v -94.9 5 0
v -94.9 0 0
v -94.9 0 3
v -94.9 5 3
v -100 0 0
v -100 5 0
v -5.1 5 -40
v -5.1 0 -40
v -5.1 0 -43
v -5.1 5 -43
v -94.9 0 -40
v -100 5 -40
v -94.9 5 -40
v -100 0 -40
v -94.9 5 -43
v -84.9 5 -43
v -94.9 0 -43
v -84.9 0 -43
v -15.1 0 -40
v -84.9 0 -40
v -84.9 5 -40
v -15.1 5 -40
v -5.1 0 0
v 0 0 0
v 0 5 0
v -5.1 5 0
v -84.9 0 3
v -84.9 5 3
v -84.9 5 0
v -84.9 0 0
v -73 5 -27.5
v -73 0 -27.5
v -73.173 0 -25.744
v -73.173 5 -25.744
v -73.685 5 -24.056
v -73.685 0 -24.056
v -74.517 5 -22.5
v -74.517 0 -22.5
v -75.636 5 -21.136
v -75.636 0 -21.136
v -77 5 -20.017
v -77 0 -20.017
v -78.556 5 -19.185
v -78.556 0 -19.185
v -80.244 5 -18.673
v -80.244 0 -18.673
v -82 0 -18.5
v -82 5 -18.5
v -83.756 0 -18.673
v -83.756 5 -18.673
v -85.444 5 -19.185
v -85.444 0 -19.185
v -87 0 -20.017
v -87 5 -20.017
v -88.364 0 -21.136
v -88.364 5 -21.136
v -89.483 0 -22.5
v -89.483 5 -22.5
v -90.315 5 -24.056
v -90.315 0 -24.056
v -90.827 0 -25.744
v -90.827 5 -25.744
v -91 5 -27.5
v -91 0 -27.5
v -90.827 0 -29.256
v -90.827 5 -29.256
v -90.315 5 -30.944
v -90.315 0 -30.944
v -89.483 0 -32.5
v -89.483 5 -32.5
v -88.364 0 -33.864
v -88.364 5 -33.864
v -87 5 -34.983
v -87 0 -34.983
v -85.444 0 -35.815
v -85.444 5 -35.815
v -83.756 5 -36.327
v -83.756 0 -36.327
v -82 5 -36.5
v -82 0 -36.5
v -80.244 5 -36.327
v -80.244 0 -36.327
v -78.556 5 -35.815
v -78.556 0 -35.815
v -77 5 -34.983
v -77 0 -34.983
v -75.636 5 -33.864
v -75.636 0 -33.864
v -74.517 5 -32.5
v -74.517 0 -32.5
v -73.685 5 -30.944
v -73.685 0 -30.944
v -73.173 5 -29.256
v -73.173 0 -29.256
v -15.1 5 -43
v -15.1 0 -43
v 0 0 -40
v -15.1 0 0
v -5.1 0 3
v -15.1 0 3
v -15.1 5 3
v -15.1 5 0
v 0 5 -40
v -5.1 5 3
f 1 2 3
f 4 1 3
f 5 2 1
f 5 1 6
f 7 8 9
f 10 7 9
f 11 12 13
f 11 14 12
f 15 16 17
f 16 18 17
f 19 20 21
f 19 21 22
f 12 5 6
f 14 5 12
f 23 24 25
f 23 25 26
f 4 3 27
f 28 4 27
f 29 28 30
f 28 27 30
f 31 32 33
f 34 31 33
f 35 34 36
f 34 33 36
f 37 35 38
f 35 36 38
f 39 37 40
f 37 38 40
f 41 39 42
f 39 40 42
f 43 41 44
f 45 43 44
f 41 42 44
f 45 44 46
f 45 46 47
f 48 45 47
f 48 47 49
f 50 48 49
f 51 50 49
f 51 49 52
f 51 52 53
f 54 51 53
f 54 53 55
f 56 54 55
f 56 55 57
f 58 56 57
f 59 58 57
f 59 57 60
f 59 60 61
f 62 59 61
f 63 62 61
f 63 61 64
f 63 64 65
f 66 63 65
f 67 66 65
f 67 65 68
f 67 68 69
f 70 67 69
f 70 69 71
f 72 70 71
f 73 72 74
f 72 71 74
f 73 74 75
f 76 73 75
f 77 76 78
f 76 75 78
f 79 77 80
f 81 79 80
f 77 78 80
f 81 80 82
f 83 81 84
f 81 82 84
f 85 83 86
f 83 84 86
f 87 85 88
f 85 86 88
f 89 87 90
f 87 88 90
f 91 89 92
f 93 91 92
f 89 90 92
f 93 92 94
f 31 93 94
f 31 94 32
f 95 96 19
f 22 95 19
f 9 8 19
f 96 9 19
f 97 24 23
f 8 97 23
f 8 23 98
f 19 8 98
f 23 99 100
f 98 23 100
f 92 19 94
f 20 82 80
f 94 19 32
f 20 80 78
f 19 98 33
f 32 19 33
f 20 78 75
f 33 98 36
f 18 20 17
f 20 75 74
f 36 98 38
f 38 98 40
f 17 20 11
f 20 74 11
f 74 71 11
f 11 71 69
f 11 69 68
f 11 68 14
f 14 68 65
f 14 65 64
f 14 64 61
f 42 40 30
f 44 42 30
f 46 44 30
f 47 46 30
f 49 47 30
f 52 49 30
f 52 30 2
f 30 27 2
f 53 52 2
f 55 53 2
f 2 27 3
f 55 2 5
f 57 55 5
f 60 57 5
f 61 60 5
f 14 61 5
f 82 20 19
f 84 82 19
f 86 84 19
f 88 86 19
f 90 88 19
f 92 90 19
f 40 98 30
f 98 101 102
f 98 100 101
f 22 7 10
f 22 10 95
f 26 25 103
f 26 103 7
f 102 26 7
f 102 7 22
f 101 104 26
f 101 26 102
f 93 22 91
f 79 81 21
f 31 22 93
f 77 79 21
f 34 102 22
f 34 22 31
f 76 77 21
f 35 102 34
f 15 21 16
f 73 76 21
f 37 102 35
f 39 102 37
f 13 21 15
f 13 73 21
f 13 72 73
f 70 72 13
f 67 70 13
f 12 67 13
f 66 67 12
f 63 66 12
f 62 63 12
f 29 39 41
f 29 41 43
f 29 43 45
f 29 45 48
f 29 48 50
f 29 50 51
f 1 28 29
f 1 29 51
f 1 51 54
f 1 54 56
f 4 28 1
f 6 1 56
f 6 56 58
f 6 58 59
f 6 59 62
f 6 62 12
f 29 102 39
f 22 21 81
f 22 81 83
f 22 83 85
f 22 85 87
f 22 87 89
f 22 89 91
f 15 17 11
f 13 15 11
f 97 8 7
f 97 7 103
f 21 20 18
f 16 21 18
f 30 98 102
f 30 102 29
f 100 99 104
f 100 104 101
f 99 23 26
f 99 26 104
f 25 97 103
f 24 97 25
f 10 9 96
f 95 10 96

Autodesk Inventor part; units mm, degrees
ref_plane "YZ Plane" through (0, 0, 0) normal (1, 0, 0) x (0, 1, 0)
ref_plane "XZ Plane" through (0, 0, 0) normal (0, 1, 0) x (-1, 0, 0)
ref_plane "XY Plane" through (0, 0, 0) normal (0, 0, 1) x (1, 0, 0)
sketch "Sketch1" plane through (0, 0, 0) normal (0, 1, 0) x (-1, 0, 0)
  line L0 (0, 0) -> (100, 0)
  line L1 (100, 0) -> (100, -40)
  line L2 (100, -40) -> (0, -40)
  line L3 (0, -40) -> (0, 0)
  line L4 (94.9, -40) -> (84.9, -40)
  line L5 (84.9, -40) -> (84.9, -43)
  line L6 (84.9, -43) -> (94.9, -43)
  line L7 (94.9, -43) -> (94.9, -40)
  line L8 (15.1, -40) -> (5.1, -40)
  line L9 (5.1, -40) -> (5.1, -43)
  line L10 (5.1, -43) -> (15.1, -43)
  line L11 (15.1, -43) -> (15.1, -40)
  line L12 (15.1, 0) -> (5.1, 0)
  line L13 (5.1, 0) -> (5.1, 3)
  line L14 (5.1, 3) -> (15.1, 3)
  line L15 (15.1, 3) -> (15.1, 0)
  line L16 (84.9, 0) -> (94.9, 0)
  line L17 (94.9, 0) -> (94.9, 3)
  line L18 (94.9, 3) -> (84.9, 3)
  line L19 (84.9, 3) -> (84.9, 0)
  dimension "d0" = 40
  dimension "d1" = 100
  dimension "d2" = 3
  dimension "d3" = 5.1
  dimension "d4" = 10
  dimension "d5" = 5.1
  dimension "d6" = 10
  dimension "d7" = 5.1
  dimension "d8" = 3
  dimension "d9" = 5.1
  dimension "d10" = 10
extrude "Extrusion1" add sketch "Sketch1" along normal blind 5
sketch "Sketch2" plane through (0, 0, 0) normal (0, -1, 0) x (1, 0, 0)
  circle A0 centre (-82, -27.5) radius 9
  line L0 (-100, -40) -> (-100, 0) projected
  line L1 (-15.1, -40) -> (-84.9, -40) projected
  point P0 (0, 0)
  dimension "d13" = 18
  dimension "d14" = 18
  dimension "d15" = 12.5
extrude "Extrusion2" cut sketch "Sketch2" against normal blind 5
properties part number "Steckerplatte_seit"
